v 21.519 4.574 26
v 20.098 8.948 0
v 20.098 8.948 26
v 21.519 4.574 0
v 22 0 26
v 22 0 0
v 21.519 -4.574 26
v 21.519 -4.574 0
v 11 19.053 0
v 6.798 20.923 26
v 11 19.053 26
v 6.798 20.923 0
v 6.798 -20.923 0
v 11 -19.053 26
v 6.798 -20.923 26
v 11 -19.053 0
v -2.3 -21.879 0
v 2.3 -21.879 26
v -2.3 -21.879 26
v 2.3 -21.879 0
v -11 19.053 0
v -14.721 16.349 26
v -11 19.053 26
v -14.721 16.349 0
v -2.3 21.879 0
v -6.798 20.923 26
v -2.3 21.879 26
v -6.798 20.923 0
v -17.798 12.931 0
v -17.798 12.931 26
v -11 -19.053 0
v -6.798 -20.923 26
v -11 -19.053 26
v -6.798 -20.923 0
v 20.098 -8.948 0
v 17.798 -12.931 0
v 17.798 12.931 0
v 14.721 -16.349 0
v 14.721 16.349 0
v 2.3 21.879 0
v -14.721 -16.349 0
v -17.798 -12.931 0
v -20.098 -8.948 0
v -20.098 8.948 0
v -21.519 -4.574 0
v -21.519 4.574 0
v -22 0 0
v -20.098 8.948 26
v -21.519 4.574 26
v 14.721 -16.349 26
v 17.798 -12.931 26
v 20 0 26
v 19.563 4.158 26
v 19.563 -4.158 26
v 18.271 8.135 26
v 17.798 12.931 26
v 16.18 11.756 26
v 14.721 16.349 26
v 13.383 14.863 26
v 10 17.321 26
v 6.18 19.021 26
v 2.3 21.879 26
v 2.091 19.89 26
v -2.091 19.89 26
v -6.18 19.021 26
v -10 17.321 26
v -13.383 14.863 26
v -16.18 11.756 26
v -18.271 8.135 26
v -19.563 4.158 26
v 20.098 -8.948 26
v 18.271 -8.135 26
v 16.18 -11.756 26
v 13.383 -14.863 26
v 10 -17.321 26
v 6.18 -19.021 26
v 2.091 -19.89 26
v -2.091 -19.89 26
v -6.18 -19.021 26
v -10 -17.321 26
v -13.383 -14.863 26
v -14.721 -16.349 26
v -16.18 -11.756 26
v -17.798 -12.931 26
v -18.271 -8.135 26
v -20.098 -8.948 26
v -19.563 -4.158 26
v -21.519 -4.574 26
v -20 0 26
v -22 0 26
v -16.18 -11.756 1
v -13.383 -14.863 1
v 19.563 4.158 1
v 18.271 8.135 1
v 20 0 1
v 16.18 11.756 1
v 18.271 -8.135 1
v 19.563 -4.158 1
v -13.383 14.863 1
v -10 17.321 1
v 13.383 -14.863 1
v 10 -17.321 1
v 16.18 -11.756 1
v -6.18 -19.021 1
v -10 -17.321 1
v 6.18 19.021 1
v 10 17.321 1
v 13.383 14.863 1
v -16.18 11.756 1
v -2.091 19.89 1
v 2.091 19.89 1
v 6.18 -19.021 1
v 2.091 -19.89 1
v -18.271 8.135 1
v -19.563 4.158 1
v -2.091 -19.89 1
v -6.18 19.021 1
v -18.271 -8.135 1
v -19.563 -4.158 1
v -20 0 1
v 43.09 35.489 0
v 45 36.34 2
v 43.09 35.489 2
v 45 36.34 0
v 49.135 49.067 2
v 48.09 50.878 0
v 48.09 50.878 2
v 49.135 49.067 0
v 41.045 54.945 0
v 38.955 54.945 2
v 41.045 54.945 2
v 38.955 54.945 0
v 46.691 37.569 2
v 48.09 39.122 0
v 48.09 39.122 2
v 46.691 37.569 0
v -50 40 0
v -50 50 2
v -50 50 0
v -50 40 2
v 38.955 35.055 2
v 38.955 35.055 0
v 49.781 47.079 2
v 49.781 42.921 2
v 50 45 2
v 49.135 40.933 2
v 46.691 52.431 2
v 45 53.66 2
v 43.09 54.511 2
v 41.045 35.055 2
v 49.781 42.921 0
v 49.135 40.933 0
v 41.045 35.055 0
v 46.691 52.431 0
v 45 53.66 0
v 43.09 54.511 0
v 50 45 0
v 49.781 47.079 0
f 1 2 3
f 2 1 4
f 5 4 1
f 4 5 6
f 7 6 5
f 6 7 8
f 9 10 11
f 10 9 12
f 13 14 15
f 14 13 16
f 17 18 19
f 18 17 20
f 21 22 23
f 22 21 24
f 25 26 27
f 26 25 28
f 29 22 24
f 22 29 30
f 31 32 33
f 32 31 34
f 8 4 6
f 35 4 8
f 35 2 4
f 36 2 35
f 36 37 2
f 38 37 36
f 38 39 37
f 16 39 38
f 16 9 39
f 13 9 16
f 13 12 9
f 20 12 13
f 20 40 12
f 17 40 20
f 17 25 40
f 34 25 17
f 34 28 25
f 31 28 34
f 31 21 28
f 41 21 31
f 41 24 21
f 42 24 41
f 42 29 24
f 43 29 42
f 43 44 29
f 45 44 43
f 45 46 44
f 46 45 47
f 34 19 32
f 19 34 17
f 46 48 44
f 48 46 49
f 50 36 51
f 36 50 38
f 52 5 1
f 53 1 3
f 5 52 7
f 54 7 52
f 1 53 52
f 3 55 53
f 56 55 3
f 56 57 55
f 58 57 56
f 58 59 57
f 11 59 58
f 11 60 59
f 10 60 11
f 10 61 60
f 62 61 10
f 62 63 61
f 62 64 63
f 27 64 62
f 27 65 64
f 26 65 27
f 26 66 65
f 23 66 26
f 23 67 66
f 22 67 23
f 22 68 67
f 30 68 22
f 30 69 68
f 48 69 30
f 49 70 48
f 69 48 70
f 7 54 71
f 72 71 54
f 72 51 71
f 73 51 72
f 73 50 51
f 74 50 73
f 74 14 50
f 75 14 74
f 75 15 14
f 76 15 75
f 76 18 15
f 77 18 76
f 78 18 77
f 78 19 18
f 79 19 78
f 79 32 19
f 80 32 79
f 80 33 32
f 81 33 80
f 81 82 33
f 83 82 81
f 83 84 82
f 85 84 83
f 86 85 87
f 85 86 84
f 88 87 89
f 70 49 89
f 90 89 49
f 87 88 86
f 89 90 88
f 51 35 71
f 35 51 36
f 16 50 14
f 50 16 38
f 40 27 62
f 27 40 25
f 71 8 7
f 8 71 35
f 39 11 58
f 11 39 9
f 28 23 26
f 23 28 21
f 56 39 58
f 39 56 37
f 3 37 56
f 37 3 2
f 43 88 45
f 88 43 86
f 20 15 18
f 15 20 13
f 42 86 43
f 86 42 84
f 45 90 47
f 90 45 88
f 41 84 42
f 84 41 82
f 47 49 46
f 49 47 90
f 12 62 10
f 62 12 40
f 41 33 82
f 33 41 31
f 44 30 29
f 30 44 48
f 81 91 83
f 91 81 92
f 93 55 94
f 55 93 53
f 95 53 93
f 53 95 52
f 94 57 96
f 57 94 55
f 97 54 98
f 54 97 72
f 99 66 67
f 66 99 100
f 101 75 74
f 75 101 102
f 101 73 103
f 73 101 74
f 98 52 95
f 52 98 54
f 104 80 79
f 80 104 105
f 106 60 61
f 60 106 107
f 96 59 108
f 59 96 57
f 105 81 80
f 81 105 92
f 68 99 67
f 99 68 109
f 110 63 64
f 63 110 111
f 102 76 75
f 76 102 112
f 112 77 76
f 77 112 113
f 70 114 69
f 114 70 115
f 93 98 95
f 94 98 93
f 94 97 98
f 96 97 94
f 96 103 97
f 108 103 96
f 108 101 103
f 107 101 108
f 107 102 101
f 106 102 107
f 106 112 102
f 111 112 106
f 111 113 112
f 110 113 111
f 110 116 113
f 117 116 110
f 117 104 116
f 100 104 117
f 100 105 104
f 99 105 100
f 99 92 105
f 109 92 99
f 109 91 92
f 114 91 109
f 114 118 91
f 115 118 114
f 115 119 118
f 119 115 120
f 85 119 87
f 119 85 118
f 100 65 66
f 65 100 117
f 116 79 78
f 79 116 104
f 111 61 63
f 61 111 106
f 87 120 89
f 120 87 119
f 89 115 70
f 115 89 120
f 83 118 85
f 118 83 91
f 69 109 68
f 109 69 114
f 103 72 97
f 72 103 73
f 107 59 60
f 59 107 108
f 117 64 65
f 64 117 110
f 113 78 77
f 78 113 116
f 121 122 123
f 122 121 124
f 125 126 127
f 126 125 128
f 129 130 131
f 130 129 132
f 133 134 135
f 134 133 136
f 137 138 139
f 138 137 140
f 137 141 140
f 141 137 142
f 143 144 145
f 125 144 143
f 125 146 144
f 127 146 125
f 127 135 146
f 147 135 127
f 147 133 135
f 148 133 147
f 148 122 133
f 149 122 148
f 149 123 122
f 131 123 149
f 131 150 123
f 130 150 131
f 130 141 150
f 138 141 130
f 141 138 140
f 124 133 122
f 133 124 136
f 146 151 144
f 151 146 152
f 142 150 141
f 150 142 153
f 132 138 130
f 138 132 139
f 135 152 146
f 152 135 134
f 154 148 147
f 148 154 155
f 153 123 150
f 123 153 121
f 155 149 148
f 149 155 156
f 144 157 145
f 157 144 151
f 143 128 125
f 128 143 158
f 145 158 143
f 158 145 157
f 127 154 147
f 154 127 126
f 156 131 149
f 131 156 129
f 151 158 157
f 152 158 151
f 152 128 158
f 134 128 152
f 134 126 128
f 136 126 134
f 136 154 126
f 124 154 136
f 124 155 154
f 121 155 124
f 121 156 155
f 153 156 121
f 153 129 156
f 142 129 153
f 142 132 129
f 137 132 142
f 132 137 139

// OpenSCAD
module EpoxyTray(side=40, wall=25, wallThick=2, base=1, handleRadius=8) {
  difference() {
    
    // Base
    cylinder(r=(side/2)+wallThick, h=base+wall);
    
    translate([0,0,base])
    cylinder(r=(side/2), h=base+wall);
    
  }
}

module EpoxyStick(length=100, width=10, height=2) {
  hull() {
    cube([length-width, width, height]);
    
    translate([length-width,width/2,0])
    cylinder(r=width, h=height);
  }
}

EpoxyTray();

translate([-50, 40, 0])
EpoxyStick();
